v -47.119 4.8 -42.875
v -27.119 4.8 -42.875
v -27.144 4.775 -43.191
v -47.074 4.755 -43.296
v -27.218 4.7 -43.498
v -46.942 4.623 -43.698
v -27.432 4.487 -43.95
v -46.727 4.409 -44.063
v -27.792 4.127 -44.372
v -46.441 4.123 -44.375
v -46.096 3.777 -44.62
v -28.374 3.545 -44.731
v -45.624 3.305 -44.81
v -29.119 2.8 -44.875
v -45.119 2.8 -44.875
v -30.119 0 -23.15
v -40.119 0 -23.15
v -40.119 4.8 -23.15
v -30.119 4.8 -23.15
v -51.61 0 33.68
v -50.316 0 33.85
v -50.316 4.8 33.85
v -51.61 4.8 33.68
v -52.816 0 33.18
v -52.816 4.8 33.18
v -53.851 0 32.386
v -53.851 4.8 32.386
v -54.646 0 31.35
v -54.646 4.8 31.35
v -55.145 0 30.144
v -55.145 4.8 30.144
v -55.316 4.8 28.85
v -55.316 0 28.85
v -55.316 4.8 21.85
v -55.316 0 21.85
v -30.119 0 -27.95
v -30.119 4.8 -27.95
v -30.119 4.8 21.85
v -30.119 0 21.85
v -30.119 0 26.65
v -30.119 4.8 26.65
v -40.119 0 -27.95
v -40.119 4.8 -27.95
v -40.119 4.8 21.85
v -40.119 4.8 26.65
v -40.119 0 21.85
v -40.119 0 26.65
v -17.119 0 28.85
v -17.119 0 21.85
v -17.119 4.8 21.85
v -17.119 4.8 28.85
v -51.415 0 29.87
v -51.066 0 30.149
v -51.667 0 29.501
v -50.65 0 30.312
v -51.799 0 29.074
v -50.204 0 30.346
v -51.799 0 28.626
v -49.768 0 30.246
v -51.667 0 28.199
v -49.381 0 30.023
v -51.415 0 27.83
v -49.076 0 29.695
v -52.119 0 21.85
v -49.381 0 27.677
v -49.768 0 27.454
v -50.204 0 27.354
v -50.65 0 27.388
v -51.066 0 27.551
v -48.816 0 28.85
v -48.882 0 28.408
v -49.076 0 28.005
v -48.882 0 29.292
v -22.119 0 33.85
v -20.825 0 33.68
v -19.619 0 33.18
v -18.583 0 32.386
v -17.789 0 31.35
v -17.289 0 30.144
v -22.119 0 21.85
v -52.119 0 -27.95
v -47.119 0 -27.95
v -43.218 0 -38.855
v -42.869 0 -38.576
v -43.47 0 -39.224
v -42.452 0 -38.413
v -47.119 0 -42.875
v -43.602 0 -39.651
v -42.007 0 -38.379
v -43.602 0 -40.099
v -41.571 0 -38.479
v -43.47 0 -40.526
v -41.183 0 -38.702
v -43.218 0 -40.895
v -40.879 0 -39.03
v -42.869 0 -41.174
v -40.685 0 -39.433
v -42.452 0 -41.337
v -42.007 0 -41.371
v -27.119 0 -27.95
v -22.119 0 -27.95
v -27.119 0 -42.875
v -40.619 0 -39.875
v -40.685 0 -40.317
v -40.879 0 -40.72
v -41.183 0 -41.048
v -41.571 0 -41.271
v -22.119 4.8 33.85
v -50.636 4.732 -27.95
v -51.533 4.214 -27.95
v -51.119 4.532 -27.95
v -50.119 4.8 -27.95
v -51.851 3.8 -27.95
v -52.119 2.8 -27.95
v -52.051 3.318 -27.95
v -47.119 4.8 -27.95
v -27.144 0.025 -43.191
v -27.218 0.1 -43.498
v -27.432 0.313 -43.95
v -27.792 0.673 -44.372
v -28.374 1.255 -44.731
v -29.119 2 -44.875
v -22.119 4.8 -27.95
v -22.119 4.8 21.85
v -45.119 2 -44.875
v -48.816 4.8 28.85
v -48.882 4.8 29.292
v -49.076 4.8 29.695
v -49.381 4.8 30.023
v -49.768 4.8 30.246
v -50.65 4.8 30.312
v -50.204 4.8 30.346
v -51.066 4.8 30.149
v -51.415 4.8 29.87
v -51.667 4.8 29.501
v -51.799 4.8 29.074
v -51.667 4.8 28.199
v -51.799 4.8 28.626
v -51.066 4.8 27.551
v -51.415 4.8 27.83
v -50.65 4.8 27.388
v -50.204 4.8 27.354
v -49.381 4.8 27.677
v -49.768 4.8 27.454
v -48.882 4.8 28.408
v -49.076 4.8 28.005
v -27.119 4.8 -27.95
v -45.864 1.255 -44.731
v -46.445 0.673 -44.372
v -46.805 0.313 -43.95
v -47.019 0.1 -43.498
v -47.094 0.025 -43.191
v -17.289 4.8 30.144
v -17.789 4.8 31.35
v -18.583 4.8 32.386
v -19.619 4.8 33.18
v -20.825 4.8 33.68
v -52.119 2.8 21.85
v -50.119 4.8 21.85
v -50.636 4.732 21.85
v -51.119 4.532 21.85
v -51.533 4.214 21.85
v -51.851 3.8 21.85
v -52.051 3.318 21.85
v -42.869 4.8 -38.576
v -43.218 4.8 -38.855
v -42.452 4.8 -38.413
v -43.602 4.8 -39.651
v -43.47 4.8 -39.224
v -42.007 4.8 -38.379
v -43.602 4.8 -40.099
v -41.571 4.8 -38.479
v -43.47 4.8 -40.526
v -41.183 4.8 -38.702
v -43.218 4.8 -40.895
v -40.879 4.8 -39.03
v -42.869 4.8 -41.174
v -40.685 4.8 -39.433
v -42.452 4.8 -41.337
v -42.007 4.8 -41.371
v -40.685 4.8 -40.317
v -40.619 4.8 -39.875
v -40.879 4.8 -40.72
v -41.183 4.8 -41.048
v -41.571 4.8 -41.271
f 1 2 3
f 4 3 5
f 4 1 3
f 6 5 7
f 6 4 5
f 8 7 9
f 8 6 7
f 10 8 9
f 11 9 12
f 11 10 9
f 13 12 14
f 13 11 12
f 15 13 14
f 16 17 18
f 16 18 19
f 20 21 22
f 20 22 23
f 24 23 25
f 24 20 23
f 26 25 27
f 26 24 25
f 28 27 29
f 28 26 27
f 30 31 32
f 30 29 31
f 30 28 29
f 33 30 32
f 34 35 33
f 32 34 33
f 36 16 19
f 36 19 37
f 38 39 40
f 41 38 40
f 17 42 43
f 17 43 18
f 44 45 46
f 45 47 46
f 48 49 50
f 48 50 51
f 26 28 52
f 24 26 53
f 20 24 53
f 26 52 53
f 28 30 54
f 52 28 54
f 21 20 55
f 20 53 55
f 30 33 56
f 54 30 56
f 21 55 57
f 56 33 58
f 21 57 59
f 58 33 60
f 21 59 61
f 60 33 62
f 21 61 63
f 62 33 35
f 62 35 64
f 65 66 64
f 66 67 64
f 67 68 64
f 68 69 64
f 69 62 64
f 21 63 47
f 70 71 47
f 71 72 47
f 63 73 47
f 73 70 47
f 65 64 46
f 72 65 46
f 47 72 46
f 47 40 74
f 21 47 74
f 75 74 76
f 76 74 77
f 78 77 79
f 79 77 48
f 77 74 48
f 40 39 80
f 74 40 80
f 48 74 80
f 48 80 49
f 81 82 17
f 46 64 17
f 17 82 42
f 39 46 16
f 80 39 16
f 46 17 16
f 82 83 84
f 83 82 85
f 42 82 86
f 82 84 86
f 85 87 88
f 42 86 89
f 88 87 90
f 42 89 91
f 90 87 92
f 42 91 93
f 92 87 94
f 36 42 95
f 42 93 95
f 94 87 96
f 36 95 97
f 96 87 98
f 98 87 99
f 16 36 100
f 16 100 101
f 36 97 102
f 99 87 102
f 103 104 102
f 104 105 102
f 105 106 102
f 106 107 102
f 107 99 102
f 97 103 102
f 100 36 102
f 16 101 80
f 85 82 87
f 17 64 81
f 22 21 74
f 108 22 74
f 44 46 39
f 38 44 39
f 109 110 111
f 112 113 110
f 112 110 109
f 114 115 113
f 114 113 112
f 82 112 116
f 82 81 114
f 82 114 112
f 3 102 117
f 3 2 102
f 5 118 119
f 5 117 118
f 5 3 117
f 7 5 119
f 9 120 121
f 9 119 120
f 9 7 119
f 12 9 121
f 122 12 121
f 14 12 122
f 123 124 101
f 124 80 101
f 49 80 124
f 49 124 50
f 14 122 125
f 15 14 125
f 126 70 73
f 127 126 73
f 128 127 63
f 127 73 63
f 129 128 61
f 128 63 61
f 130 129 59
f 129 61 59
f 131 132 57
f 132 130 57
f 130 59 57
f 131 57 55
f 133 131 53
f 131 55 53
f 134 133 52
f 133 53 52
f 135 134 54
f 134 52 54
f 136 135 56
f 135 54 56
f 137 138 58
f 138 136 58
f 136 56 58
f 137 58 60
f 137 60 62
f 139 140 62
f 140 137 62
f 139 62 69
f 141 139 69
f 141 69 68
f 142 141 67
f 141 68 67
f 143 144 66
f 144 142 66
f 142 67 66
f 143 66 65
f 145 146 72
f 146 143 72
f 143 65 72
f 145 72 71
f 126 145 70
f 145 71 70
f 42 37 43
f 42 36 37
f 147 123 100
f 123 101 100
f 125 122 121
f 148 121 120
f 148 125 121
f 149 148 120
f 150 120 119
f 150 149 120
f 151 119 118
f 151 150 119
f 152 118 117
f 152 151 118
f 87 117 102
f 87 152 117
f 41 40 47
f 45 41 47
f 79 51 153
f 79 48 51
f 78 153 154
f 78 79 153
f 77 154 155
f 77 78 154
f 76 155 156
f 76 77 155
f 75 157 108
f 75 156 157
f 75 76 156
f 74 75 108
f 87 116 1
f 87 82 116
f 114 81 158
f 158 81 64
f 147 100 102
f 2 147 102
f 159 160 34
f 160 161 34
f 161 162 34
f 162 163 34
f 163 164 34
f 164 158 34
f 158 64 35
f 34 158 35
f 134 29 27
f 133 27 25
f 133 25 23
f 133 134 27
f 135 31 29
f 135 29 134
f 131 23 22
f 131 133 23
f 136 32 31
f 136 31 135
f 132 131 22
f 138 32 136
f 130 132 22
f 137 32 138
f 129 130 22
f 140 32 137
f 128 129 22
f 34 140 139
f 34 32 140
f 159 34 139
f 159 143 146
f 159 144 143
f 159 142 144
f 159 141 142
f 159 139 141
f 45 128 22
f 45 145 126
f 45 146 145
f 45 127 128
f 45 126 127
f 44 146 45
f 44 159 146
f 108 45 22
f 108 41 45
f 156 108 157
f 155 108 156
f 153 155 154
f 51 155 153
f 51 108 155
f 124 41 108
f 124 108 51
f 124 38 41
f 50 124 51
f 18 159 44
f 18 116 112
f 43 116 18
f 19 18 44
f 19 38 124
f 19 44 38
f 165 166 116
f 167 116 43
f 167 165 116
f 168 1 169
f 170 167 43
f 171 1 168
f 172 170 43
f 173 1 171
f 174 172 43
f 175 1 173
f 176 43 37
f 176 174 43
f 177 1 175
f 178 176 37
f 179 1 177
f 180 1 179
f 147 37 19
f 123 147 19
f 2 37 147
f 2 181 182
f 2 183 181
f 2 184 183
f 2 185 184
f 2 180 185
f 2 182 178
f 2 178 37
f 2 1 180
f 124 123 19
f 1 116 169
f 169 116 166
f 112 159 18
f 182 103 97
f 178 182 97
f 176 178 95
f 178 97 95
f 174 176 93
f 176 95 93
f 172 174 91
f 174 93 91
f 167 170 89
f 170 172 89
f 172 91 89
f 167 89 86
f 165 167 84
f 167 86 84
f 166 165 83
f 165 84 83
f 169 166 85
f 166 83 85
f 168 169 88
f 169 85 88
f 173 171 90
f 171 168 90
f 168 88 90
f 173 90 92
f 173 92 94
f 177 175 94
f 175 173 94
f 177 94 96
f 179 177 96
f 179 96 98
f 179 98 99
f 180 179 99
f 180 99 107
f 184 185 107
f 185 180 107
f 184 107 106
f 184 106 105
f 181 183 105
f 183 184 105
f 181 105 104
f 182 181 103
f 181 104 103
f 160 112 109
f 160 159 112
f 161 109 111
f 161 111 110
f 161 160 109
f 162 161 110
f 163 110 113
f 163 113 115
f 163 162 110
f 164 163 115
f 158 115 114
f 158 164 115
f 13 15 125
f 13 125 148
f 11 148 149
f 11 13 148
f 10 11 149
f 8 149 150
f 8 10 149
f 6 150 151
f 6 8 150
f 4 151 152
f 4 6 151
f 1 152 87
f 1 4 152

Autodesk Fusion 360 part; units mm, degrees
sketch "Sketch1" plane through (0, 0, 0) normal (0, 1, 0) x (1, 0, 0)
  circle A0 centre (0, 0) radius 14 construction
  circle A1 centre (0, 0) radius 48 construction
  circle A2 centre (0, 0) radius 58 construction
  circle A3 centre (0, 0) radius 68 construction
  line L0 (0, 0) -> (0, 52) construction
  line L1 (-9.7468, 47) -> (-49.1426, 47) construction
  line L2 (-35.0918, 32.75) -> (-59.5939, 32.75) construction
  line L3 (-39.023, 27.95) -> (-61.9903, 27.95) construction
  line L4 (-42.7385, -21.85) -> (-64.3939, -21.85) construction
  circle A4 centre (-50.3158, -28.85) radius 1.5
  circle A5 centre (-42.1187, 39.875) radius 1.5
  line L5 (-55.3158, -21.85) -> (-55.3158, -28.85)
  line L6 (-50.3158, -33.85) -> (-22.1187, -33.85)
  line L7 (-22.1187, -21.85) -> (-22.1187, 27.95)
  line L8 (-27.1187, 44.875) -> (-47.1187, 44.875)
  line L9 (-52.1187, -21.85) -> (-55.3158, -21.85)
  line L10 (-30.1187, 27.95) -> (-40.1187, 27.95)
  arc A6 (-50.3158, -33.85) -> (-55.3158, -28.85) centre (-50.3158, -28.85) ccw construction
  arc A7 (-55.3158, -28.85) -> (-50.3158, -33.85) centre (-50.3158, -28.85) ccw
  line L11 (-55.3158, -33.85) -> (-50.3158, -33.85) construction
  line L12 (-55.3158, -28.85) -> (-55.3158, -33.85) construction
  line L13 (-22.1187, -21.85) -> (-17.1187, -21.85)
  line L14 (-17.1187, -21.85) -> (-17.1187, -28.85)
  line L15 (-22.1187, -33.85) -> (-17.1187, -33.85) construction
  line L16 (-17.1187, -28.85) -> (-17.1187, -33.85) construction
  arc A8 (-17.1187, -28.85) -> (-22.1187, -33.85) centre (-22.1187, -28.85) ccw construction
  arc A9 (-22.1187, -33.85) -> (-17.1187, -28.85) centre (-22.1187, -28.85) ccw
  line L17 (-65.8278, -17.05) -> (-44.8698, -17.05) construction
  line L18 (-40.1187, -21.85) -> (-30.1187, -21.85)
  line L19 (-30.1187, -21.85) -> (-30.1187, -26.65)
  line L20 (-30.1187, -26.65) -> (-40.1187, -26.65)
  line L21 (-40.1187, -26.65) -> (-40.1187, -21.85)
  line L22 (-40.1187, 27.95) -> (-40.1187, 23.15)
  line L23 (-40.1187, 23.15) -> (-30.1187, 23.15)
  line L24 (-30.1187, 23.15) -> (-30.1187, 27.95)
  line L25 (-30.1187, -21.85) -> (-22.1187, -21.85) construction
  line L26 (-52.1187, 27.95) -> (-47.1187, 27.95)
  line L27 (-47.1187, 27.95) -> (-47.1187, 44.875)
  line L28 (-22.1187, 27.95) -> (-27.1187, 27.95)
  line L29 (-27.1187, 27.95) -> (-27.1187, 44.875)
  line L30 (-27.1187, 27.95) -> (-30.1187, 27.95) construction
  line L31 (-52.1187, 27.95) -> (-52.1187, -21.85)
  point P0 (0, 14)
  point P1 (-42.1187, 39.875)
  point P2 (-50.3158, -28.85)
  dimension "d1" = 28
  dimension "d2" = 96
  dimension "d3" = 116
  dimension "d4" = 136
  dimension "d5" = 38
  dimension "d6" = 5
  dimension "d7" = 19.25
  dimension "d8" = 4.8
  dimension "d11" = 7
  dimension "d12" = 7.125
  dimension "d13" = 3
  dimension "d14" = 3
  dimension "d15" = 10
  dimension "d24" = 5
  dimension "d27" = 5
  dimension "d28" = 10
  dimension "d29" = 4.8
  dimension "d30" = 45
  dimension "d31" = 10
  dimension "d32" = 4.8
  dimension "d34" = 8
  dimension "d35" = 4.8
  dimension "d36" = 10
  dimension "d37" = 8
  dimension "d38" = 5
  dimension "d39" = 5
  dimension "d40" = 5
  dimension "d43" = 12
extrude "Extrude1" add sketch "Sketch1" along normal blind 4.8
fillet "Fillet1" radius 2 4 edges at (-37.1187, 0, -44.875) (-47.1187, 2.4, -44.875) (-37.1187, 4.8, -44.875) (-27.1187, 2.4, -44.875)
fillet "Fillet2" radius 2 1 edges at (-52.1187, 4.8, -3.05)
